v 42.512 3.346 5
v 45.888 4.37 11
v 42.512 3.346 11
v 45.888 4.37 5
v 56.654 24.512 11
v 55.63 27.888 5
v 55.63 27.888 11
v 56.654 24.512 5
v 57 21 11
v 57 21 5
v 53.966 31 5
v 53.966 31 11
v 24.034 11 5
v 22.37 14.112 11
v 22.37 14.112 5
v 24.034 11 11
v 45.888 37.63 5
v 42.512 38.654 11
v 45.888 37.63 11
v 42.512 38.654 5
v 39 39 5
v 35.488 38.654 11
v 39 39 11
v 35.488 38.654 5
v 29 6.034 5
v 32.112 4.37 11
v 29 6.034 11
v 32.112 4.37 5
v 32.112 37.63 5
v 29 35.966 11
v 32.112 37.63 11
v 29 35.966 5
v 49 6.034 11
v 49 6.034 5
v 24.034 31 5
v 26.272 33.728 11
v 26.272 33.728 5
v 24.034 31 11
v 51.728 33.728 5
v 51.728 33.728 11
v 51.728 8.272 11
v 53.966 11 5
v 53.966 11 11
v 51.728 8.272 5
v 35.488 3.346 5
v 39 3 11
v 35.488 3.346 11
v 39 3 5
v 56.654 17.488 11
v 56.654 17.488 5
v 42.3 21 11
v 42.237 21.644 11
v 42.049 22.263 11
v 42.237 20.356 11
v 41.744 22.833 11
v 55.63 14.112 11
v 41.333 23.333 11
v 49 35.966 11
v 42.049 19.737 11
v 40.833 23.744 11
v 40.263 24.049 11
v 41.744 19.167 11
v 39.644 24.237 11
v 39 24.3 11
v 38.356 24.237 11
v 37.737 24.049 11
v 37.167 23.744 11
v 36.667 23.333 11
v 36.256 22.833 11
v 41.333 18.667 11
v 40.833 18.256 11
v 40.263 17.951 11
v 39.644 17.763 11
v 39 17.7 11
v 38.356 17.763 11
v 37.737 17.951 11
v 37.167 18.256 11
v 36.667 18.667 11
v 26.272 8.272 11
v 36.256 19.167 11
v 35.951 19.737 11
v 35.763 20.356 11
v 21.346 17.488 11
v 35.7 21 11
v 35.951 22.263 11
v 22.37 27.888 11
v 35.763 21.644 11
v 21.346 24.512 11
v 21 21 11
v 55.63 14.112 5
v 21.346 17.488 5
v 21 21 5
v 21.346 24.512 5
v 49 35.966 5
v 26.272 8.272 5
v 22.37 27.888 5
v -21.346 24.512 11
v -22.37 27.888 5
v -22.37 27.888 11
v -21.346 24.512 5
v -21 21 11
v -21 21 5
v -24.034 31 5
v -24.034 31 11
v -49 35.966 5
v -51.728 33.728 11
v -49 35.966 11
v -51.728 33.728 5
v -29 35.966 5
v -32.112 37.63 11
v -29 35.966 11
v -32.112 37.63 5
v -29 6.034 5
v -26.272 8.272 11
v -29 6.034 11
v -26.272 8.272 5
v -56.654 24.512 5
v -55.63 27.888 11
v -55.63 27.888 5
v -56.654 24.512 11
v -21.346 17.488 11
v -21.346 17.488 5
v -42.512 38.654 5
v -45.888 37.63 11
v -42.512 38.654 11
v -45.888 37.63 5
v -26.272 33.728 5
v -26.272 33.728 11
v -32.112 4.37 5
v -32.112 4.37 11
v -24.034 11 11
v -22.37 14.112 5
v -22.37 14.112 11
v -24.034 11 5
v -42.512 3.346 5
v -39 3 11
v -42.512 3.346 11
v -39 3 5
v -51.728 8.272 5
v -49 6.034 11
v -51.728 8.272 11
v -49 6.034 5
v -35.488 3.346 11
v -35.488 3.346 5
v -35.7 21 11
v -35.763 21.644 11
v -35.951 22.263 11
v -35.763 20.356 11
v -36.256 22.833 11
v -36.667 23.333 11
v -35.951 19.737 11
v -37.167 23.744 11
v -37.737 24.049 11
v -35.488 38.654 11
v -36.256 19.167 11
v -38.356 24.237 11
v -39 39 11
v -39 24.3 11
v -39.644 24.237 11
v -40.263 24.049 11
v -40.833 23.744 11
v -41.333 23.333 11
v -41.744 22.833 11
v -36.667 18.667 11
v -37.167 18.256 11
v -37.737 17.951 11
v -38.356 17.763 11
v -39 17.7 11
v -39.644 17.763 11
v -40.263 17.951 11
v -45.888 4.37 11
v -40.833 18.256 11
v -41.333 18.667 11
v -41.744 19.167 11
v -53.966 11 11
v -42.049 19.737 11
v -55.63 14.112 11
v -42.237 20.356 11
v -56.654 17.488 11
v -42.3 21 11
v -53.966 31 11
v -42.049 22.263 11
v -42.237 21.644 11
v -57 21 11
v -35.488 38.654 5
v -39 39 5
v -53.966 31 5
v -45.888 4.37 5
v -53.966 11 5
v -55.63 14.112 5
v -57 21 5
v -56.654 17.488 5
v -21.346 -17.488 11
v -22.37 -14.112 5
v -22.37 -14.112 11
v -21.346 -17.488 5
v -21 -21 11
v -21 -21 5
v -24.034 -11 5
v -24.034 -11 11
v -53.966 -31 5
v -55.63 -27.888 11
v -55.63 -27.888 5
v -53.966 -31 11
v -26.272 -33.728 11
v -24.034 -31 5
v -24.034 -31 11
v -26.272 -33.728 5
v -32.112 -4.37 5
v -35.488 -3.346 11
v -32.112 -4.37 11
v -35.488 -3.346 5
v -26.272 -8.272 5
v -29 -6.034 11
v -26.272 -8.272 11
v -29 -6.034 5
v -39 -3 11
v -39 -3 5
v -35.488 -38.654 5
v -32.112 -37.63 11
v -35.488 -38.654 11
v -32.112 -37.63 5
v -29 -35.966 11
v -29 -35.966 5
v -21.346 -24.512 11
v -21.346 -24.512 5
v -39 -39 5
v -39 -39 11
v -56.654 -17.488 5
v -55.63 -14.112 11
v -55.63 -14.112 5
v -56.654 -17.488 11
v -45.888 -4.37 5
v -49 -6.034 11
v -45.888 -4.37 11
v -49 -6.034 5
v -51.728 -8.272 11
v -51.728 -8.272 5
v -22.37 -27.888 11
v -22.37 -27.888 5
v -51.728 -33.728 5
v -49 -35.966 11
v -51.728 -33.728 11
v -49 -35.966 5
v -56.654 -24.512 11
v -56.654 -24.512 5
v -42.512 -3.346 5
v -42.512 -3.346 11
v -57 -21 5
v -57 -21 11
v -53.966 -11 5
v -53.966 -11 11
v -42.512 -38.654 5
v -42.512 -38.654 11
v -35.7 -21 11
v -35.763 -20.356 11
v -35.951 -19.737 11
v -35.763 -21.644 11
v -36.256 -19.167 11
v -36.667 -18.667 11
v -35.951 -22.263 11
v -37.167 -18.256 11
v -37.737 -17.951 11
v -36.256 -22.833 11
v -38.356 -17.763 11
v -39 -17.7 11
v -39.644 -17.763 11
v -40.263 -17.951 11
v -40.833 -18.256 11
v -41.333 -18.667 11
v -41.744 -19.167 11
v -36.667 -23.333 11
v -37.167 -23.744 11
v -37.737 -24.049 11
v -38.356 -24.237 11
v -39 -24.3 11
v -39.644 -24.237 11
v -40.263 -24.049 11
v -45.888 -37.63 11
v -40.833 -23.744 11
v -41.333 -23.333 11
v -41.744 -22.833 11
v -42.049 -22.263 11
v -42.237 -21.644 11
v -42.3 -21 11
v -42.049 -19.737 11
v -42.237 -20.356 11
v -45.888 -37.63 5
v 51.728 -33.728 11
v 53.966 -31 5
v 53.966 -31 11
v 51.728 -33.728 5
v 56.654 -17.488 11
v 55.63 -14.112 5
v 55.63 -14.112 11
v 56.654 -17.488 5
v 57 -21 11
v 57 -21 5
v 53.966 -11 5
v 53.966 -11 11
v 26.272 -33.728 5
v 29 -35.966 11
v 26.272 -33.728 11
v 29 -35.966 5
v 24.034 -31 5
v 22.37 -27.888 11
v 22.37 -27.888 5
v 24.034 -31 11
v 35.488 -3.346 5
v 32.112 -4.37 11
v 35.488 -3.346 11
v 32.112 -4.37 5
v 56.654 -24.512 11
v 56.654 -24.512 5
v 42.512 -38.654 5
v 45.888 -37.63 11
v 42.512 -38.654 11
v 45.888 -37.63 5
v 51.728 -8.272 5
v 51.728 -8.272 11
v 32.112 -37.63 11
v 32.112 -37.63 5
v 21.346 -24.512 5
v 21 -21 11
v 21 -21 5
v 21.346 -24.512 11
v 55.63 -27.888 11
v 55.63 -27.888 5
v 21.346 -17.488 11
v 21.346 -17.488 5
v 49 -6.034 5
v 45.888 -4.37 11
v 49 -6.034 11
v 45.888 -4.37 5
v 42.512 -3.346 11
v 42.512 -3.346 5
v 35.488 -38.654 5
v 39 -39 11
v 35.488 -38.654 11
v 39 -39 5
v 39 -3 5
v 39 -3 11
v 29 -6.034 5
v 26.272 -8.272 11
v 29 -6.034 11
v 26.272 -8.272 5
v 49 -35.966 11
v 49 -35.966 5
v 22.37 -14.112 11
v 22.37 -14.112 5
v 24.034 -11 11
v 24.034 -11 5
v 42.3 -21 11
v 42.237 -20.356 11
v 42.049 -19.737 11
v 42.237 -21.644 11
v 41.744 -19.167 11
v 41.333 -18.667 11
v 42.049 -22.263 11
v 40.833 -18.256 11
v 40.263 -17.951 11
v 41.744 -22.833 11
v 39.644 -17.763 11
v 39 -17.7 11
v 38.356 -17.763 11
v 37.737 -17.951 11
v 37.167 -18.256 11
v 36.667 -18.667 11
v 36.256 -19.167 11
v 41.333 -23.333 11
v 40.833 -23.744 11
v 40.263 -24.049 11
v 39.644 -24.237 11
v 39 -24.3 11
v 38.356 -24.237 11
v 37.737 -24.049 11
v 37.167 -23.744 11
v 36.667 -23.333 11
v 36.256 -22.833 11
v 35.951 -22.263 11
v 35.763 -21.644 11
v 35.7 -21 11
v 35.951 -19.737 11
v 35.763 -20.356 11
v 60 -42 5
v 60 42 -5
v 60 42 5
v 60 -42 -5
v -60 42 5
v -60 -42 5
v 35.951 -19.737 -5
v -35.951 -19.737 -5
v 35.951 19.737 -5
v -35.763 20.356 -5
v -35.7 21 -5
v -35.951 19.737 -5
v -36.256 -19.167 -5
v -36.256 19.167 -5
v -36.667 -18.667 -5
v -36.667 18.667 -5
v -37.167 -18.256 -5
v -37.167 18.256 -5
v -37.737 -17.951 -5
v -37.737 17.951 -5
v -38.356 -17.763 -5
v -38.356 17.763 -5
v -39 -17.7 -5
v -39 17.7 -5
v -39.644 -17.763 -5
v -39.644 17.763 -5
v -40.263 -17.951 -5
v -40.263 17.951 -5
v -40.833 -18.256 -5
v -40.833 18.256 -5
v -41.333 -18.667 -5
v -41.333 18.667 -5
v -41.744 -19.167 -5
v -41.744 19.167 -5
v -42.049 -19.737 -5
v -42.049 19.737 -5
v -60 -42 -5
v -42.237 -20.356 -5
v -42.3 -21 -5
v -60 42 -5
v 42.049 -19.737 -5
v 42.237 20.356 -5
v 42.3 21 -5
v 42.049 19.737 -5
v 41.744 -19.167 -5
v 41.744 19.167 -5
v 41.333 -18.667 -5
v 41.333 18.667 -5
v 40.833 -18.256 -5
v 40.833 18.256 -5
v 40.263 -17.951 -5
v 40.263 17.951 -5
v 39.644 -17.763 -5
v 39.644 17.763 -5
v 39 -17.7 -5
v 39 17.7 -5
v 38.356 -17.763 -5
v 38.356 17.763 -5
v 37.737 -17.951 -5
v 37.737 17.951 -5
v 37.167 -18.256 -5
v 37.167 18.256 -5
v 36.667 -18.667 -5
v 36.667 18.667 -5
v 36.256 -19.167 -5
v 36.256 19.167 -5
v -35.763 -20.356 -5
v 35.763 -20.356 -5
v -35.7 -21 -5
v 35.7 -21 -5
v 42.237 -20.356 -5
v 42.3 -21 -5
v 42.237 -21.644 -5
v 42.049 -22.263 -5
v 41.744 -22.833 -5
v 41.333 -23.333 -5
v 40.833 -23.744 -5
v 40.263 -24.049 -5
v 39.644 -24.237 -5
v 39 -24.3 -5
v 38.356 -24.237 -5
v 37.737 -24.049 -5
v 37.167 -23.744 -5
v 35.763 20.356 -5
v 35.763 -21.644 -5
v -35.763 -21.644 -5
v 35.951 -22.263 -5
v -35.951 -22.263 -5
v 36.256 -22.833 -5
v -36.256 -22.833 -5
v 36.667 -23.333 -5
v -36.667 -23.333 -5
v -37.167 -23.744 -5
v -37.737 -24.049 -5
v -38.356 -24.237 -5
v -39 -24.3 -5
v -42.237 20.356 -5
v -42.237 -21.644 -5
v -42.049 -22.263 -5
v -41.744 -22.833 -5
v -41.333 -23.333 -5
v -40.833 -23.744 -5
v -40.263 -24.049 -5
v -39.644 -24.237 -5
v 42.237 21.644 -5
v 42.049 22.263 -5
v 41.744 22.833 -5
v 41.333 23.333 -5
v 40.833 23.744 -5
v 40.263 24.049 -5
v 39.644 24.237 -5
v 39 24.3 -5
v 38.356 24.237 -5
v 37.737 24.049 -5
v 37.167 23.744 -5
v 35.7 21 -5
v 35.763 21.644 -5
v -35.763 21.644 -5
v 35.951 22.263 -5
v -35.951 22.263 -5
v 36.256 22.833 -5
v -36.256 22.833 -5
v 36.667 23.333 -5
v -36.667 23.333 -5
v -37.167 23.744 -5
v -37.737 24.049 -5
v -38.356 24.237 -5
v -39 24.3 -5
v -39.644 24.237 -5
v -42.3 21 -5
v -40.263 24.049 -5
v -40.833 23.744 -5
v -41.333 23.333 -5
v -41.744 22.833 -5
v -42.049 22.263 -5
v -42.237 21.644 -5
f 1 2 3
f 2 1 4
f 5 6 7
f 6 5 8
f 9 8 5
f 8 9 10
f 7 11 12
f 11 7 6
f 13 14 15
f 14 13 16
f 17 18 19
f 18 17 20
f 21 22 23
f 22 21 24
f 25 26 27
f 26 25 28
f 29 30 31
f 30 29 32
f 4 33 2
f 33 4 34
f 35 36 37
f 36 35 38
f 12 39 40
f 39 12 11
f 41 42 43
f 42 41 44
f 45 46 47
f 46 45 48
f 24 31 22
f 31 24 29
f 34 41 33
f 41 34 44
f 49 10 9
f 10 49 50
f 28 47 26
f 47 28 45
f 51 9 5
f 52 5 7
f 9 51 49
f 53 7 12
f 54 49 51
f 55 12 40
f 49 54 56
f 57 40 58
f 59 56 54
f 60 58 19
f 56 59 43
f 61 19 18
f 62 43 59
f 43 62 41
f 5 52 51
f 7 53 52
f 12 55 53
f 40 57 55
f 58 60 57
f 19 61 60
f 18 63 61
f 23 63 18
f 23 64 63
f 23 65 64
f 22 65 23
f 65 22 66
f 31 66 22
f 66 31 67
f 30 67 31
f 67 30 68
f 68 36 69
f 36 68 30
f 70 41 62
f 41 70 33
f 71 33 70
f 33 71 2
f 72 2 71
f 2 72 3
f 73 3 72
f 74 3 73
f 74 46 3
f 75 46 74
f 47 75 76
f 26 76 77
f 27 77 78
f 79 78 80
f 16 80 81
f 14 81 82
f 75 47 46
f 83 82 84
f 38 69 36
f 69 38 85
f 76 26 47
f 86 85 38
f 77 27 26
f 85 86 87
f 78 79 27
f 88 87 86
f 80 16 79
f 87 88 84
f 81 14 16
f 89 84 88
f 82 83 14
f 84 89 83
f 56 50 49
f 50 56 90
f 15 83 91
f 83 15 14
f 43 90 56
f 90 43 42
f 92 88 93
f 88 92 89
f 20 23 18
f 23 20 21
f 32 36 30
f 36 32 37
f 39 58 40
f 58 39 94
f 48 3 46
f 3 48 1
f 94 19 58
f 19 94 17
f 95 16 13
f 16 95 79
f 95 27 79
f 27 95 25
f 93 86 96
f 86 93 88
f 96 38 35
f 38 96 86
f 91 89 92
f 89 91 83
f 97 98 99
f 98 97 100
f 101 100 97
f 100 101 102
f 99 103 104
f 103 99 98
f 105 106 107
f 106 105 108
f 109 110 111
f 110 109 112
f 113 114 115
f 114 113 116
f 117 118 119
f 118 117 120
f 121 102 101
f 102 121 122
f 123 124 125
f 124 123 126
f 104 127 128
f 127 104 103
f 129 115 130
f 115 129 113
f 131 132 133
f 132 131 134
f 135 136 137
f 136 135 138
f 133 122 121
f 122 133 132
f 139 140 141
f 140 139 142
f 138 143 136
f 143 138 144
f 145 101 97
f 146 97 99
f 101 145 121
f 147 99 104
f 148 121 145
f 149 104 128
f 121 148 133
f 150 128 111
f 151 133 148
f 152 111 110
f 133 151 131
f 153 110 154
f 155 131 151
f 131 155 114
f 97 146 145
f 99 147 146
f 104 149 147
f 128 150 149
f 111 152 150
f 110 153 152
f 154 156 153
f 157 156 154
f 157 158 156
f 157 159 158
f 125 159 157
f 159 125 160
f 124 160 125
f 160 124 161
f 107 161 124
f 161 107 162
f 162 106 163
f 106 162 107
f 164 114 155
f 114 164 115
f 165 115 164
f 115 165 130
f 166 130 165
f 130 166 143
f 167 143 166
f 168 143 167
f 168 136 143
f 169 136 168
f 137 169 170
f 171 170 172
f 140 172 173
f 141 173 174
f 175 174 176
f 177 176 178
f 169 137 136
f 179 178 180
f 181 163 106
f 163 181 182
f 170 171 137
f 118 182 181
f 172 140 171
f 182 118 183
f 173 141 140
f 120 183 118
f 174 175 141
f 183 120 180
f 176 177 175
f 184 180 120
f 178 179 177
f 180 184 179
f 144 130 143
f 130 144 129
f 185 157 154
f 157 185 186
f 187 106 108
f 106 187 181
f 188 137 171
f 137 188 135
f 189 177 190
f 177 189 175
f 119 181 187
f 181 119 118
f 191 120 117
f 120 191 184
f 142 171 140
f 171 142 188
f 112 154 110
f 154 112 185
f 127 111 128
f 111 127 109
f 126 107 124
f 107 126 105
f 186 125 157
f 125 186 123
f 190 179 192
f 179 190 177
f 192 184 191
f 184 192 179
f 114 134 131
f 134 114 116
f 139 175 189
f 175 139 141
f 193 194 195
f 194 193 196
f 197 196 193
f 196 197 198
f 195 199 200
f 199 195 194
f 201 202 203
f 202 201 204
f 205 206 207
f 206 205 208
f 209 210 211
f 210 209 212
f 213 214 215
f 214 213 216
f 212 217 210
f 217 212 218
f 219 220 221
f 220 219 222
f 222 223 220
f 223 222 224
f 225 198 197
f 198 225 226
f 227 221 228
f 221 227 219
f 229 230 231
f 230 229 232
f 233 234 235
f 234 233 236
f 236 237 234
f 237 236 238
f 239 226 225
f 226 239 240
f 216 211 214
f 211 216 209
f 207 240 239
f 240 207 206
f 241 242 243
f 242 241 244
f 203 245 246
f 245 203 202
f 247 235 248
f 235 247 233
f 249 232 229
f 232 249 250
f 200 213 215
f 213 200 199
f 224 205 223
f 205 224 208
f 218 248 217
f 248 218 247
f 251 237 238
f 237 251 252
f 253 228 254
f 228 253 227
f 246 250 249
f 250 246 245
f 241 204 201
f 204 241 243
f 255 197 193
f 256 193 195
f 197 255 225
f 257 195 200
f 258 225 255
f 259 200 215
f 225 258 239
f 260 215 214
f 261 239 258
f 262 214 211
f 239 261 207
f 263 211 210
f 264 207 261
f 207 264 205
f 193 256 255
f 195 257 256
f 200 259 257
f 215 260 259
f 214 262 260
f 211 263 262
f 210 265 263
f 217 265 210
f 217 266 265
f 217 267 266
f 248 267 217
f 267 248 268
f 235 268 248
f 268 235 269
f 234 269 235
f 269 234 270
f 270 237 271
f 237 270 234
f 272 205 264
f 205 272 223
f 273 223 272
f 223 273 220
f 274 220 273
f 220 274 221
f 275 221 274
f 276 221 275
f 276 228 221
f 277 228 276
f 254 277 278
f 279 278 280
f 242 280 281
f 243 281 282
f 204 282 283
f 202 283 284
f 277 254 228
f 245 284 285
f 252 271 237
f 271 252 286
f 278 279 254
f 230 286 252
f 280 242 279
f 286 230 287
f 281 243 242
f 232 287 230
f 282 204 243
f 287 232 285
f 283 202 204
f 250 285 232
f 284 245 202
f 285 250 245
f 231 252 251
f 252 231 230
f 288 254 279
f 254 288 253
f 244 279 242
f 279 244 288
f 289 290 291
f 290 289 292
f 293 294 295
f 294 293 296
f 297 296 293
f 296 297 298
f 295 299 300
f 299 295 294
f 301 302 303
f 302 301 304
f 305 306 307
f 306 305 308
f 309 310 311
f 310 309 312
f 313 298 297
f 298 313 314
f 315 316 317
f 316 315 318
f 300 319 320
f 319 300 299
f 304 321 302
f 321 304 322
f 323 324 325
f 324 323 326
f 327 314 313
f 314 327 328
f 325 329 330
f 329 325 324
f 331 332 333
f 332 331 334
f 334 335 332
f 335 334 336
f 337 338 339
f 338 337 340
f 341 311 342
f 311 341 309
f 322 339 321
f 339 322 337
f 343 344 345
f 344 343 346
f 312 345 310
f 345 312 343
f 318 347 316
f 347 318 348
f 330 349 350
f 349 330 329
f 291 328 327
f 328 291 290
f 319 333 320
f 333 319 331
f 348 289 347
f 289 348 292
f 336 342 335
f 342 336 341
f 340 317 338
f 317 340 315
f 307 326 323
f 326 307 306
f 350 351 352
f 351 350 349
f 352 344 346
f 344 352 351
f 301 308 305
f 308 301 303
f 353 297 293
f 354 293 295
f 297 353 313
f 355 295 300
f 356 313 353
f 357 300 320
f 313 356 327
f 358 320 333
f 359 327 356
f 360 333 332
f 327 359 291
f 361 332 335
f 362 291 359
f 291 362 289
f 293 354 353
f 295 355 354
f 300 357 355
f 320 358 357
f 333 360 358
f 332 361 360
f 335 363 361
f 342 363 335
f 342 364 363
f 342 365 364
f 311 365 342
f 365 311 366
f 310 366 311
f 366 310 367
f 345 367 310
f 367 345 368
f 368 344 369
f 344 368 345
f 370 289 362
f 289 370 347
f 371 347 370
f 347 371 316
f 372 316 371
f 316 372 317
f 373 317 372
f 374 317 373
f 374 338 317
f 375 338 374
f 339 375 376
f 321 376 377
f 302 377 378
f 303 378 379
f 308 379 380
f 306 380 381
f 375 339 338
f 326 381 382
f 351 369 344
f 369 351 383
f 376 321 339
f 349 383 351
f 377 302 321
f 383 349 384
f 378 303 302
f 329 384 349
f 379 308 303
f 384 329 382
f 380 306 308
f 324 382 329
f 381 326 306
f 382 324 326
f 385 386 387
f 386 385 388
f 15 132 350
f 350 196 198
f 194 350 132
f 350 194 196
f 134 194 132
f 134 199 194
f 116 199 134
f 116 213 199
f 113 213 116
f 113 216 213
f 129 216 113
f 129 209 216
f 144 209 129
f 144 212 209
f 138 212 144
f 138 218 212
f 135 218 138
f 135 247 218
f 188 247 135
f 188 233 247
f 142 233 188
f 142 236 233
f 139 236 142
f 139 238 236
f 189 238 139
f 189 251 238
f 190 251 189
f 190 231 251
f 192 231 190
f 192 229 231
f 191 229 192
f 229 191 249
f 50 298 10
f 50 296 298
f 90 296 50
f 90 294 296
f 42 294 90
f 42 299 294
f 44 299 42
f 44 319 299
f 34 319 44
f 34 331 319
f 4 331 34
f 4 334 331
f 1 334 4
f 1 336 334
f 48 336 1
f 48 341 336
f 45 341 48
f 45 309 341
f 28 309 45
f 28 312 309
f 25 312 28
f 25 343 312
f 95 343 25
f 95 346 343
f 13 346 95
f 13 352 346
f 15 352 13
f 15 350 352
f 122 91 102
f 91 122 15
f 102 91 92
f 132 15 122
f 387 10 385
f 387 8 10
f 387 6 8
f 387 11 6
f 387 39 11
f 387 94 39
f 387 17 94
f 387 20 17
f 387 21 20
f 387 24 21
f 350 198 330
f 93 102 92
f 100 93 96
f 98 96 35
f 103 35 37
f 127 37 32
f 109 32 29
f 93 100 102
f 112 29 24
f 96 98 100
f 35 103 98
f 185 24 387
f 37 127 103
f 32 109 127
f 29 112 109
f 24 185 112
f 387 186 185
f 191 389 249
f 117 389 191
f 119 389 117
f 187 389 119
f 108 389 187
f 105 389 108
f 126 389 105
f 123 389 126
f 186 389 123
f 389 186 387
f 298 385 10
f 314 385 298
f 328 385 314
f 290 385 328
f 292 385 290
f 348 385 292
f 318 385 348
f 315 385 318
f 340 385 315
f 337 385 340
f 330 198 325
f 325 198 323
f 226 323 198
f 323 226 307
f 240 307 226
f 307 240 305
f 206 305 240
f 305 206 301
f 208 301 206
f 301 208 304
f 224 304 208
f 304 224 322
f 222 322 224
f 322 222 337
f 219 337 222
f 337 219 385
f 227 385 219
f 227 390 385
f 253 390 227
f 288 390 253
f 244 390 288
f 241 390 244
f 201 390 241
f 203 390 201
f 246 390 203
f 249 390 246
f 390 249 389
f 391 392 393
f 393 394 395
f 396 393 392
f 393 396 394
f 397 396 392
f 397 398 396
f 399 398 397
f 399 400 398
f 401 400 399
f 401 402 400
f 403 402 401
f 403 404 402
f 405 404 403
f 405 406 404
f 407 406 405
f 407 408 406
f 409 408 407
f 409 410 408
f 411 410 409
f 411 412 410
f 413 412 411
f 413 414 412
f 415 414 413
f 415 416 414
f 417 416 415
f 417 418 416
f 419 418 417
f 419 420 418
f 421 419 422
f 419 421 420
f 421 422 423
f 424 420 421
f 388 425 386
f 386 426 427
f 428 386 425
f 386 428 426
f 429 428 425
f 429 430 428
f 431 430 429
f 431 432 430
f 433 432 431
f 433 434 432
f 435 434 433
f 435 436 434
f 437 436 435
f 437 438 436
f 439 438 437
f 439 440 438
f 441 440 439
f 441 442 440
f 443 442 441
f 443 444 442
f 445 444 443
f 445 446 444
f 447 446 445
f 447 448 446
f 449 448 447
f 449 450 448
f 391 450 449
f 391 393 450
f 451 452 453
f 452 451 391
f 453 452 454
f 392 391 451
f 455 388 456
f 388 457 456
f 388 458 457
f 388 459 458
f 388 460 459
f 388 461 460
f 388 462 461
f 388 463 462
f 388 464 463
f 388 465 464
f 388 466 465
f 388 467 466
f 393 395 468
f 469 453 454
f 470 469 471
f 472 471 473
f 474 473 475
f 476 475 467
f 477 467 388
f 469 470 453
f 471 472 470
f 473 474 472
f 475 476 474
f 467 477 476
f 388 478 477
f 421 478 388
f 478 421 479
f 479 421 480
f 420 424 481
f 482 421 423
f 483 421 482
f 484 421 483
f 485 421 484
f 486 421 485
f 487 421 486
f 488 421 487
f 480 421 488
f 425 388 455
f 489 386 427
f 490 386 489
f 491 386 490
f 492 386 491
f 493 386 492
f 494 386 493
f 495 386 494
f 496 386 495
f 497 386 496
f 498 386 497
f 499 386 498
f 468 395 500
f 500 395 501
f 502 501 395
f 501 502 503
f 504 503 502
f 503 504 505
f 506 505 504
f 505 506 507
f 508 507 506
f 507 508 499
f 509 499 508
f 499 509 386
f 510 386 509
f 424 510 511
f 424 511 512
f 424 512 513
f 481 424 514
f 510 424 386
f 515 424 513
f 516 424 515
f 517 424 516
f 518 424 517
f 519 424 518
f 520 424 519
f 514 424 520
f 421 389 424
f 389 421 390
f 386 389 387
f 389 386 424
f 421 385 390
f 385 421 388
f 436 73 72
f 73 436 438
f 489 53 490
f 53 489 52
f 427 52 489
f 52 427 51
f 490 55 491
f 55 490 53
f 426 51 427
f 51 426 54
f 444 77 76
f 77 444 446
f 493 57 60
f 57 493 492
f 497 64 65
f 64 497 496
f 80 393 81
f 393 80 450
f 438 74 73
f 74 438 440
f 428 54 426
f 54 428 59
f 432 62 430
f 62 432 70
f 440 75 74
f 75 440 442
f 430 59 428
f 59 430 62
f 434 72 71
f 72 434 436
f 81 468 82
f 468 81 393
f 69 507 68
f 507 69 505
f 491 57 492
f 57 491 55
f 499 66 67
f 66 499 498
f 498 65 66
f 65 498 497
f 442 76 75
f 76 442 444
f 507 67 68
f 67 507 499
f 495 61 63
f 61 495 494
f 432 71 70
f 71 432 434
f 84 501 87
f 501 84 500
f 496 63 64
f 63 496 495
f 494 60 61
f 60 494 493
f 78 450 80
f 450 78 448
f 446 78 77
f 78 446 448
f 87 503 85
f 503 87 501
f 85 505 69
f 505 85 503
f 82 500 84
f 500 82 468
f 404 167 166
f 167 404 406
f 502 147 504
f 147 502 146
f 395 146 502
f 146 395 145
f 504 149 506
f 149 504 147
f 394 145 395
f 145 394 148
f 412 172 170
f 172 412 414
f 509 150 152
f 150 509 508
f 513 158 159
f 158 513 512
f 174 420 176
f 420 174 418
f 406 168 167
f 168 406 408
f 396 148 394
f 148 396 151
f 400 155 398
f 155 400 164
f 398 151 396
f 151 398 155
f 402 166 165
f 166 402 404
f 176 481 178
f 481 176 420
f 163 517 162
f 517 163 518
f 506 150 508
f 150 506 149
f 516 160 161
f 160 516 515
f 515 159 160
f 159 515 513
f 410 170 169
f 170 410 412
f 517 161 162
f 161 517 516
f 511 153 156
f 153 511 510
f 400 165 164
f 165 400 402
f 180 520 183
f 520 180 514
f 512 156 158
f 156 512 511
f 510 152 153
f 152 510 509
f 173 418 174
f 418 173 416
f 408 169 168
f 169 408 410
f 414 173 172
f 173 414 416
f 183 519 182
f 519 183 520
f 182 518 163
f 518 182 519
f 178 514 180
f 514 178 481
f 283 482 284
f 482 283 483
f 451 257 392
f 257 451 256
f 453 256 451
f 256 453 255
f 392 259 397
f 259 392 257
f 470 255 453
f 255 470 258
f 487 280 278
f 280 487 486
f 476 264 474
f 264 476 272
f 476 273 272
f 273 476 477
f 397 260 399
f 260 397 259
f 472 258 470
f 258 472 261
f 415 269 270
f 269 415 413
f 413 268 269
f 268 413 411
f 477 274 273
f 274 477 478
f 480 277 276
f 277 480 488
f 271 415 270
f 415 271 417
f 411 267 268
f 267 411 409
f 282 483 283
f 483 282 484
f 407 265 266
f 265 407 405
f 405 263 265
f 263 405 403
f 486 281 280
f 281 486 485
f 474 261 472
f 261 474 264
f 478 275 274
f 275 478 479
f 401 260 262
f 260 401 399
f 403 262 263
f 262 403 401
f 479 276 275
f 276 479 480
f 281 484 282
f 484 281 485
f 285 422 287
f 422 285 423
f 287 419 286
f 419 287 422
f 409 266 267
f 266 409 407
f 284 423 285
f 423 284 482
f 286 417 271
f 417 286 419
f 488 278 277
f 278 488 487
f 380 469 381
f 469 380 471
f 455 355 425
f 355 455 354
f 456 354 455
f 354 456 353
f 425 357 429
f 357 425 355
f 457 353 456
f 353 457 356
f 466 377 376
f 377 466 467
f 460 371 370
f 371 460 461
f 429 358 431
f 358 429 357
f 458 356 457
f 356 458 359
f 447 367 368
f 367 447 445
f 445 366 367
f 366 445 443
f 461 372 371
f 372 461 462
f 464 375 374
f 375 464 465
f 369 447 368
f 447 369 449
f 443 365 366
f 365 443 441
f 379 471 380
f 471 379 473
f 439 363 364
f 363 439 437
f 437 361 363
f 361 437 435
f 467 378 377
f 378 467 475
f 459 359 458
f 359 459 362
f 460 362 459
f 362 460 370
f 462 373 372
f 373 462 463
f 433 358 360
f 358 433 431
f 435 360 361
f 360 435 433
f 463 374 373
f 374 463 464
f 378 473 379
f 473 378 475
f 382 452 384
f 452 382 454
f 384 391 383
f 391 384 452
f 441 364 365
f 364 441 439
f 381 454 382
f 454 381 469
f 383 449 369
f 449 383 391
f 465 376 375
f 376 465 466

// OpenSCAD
$fn = 32;

// ----------------------------------------------------------------------
// Anchor pads 120 x 84 x 16
// four corner bosses with anchor holes
// ----------------------------------------------------------------------

// --- parameters (mm) ---
plate = [120, 84, 10];  // base plate size (x, y, z)
pads = 4;               // boss count, one per corner
edge = 21;              // boss centre offset from the plate edge
boss_d = 36;            // boss diameter
boss_h = 6;             // boss height above the base plate
hole_d = 6.6;           // hole diameter

// --- derived feature positions (mm) ---
height = plate[2] + boss_h;      // = 16   overall height of the part
corner_x = plate[0] / 2 - edge;  // = 39   boss centre X
corner_y = plate[1] / 2 - edge;  // = 21   boss centre Y
feature_centers = [
  [corner_x, corner_y],
  [-corner_x, corner_y],
  [-corner_x, -corner_y],
  [corner_x, -corner_y]
];   // boss centres, anchor holes are drilled there

// base plate, four bosses standing on it, anchor holes all the way through
difference() {
  union() {
    cube(plate, center = true);
    for (centre = feature_centers)
      translate([centre[0], centre[1], plate[2] / 2 - 1])
        cylinder(d = boss_d, h = boss_h + 1);
  }
  for (centre = feature_centers)
    translate([centre[0], centre[1], -height])
      cylinder(d = hole_d, h = 2 * height + 2);  // through boss and plate
}
